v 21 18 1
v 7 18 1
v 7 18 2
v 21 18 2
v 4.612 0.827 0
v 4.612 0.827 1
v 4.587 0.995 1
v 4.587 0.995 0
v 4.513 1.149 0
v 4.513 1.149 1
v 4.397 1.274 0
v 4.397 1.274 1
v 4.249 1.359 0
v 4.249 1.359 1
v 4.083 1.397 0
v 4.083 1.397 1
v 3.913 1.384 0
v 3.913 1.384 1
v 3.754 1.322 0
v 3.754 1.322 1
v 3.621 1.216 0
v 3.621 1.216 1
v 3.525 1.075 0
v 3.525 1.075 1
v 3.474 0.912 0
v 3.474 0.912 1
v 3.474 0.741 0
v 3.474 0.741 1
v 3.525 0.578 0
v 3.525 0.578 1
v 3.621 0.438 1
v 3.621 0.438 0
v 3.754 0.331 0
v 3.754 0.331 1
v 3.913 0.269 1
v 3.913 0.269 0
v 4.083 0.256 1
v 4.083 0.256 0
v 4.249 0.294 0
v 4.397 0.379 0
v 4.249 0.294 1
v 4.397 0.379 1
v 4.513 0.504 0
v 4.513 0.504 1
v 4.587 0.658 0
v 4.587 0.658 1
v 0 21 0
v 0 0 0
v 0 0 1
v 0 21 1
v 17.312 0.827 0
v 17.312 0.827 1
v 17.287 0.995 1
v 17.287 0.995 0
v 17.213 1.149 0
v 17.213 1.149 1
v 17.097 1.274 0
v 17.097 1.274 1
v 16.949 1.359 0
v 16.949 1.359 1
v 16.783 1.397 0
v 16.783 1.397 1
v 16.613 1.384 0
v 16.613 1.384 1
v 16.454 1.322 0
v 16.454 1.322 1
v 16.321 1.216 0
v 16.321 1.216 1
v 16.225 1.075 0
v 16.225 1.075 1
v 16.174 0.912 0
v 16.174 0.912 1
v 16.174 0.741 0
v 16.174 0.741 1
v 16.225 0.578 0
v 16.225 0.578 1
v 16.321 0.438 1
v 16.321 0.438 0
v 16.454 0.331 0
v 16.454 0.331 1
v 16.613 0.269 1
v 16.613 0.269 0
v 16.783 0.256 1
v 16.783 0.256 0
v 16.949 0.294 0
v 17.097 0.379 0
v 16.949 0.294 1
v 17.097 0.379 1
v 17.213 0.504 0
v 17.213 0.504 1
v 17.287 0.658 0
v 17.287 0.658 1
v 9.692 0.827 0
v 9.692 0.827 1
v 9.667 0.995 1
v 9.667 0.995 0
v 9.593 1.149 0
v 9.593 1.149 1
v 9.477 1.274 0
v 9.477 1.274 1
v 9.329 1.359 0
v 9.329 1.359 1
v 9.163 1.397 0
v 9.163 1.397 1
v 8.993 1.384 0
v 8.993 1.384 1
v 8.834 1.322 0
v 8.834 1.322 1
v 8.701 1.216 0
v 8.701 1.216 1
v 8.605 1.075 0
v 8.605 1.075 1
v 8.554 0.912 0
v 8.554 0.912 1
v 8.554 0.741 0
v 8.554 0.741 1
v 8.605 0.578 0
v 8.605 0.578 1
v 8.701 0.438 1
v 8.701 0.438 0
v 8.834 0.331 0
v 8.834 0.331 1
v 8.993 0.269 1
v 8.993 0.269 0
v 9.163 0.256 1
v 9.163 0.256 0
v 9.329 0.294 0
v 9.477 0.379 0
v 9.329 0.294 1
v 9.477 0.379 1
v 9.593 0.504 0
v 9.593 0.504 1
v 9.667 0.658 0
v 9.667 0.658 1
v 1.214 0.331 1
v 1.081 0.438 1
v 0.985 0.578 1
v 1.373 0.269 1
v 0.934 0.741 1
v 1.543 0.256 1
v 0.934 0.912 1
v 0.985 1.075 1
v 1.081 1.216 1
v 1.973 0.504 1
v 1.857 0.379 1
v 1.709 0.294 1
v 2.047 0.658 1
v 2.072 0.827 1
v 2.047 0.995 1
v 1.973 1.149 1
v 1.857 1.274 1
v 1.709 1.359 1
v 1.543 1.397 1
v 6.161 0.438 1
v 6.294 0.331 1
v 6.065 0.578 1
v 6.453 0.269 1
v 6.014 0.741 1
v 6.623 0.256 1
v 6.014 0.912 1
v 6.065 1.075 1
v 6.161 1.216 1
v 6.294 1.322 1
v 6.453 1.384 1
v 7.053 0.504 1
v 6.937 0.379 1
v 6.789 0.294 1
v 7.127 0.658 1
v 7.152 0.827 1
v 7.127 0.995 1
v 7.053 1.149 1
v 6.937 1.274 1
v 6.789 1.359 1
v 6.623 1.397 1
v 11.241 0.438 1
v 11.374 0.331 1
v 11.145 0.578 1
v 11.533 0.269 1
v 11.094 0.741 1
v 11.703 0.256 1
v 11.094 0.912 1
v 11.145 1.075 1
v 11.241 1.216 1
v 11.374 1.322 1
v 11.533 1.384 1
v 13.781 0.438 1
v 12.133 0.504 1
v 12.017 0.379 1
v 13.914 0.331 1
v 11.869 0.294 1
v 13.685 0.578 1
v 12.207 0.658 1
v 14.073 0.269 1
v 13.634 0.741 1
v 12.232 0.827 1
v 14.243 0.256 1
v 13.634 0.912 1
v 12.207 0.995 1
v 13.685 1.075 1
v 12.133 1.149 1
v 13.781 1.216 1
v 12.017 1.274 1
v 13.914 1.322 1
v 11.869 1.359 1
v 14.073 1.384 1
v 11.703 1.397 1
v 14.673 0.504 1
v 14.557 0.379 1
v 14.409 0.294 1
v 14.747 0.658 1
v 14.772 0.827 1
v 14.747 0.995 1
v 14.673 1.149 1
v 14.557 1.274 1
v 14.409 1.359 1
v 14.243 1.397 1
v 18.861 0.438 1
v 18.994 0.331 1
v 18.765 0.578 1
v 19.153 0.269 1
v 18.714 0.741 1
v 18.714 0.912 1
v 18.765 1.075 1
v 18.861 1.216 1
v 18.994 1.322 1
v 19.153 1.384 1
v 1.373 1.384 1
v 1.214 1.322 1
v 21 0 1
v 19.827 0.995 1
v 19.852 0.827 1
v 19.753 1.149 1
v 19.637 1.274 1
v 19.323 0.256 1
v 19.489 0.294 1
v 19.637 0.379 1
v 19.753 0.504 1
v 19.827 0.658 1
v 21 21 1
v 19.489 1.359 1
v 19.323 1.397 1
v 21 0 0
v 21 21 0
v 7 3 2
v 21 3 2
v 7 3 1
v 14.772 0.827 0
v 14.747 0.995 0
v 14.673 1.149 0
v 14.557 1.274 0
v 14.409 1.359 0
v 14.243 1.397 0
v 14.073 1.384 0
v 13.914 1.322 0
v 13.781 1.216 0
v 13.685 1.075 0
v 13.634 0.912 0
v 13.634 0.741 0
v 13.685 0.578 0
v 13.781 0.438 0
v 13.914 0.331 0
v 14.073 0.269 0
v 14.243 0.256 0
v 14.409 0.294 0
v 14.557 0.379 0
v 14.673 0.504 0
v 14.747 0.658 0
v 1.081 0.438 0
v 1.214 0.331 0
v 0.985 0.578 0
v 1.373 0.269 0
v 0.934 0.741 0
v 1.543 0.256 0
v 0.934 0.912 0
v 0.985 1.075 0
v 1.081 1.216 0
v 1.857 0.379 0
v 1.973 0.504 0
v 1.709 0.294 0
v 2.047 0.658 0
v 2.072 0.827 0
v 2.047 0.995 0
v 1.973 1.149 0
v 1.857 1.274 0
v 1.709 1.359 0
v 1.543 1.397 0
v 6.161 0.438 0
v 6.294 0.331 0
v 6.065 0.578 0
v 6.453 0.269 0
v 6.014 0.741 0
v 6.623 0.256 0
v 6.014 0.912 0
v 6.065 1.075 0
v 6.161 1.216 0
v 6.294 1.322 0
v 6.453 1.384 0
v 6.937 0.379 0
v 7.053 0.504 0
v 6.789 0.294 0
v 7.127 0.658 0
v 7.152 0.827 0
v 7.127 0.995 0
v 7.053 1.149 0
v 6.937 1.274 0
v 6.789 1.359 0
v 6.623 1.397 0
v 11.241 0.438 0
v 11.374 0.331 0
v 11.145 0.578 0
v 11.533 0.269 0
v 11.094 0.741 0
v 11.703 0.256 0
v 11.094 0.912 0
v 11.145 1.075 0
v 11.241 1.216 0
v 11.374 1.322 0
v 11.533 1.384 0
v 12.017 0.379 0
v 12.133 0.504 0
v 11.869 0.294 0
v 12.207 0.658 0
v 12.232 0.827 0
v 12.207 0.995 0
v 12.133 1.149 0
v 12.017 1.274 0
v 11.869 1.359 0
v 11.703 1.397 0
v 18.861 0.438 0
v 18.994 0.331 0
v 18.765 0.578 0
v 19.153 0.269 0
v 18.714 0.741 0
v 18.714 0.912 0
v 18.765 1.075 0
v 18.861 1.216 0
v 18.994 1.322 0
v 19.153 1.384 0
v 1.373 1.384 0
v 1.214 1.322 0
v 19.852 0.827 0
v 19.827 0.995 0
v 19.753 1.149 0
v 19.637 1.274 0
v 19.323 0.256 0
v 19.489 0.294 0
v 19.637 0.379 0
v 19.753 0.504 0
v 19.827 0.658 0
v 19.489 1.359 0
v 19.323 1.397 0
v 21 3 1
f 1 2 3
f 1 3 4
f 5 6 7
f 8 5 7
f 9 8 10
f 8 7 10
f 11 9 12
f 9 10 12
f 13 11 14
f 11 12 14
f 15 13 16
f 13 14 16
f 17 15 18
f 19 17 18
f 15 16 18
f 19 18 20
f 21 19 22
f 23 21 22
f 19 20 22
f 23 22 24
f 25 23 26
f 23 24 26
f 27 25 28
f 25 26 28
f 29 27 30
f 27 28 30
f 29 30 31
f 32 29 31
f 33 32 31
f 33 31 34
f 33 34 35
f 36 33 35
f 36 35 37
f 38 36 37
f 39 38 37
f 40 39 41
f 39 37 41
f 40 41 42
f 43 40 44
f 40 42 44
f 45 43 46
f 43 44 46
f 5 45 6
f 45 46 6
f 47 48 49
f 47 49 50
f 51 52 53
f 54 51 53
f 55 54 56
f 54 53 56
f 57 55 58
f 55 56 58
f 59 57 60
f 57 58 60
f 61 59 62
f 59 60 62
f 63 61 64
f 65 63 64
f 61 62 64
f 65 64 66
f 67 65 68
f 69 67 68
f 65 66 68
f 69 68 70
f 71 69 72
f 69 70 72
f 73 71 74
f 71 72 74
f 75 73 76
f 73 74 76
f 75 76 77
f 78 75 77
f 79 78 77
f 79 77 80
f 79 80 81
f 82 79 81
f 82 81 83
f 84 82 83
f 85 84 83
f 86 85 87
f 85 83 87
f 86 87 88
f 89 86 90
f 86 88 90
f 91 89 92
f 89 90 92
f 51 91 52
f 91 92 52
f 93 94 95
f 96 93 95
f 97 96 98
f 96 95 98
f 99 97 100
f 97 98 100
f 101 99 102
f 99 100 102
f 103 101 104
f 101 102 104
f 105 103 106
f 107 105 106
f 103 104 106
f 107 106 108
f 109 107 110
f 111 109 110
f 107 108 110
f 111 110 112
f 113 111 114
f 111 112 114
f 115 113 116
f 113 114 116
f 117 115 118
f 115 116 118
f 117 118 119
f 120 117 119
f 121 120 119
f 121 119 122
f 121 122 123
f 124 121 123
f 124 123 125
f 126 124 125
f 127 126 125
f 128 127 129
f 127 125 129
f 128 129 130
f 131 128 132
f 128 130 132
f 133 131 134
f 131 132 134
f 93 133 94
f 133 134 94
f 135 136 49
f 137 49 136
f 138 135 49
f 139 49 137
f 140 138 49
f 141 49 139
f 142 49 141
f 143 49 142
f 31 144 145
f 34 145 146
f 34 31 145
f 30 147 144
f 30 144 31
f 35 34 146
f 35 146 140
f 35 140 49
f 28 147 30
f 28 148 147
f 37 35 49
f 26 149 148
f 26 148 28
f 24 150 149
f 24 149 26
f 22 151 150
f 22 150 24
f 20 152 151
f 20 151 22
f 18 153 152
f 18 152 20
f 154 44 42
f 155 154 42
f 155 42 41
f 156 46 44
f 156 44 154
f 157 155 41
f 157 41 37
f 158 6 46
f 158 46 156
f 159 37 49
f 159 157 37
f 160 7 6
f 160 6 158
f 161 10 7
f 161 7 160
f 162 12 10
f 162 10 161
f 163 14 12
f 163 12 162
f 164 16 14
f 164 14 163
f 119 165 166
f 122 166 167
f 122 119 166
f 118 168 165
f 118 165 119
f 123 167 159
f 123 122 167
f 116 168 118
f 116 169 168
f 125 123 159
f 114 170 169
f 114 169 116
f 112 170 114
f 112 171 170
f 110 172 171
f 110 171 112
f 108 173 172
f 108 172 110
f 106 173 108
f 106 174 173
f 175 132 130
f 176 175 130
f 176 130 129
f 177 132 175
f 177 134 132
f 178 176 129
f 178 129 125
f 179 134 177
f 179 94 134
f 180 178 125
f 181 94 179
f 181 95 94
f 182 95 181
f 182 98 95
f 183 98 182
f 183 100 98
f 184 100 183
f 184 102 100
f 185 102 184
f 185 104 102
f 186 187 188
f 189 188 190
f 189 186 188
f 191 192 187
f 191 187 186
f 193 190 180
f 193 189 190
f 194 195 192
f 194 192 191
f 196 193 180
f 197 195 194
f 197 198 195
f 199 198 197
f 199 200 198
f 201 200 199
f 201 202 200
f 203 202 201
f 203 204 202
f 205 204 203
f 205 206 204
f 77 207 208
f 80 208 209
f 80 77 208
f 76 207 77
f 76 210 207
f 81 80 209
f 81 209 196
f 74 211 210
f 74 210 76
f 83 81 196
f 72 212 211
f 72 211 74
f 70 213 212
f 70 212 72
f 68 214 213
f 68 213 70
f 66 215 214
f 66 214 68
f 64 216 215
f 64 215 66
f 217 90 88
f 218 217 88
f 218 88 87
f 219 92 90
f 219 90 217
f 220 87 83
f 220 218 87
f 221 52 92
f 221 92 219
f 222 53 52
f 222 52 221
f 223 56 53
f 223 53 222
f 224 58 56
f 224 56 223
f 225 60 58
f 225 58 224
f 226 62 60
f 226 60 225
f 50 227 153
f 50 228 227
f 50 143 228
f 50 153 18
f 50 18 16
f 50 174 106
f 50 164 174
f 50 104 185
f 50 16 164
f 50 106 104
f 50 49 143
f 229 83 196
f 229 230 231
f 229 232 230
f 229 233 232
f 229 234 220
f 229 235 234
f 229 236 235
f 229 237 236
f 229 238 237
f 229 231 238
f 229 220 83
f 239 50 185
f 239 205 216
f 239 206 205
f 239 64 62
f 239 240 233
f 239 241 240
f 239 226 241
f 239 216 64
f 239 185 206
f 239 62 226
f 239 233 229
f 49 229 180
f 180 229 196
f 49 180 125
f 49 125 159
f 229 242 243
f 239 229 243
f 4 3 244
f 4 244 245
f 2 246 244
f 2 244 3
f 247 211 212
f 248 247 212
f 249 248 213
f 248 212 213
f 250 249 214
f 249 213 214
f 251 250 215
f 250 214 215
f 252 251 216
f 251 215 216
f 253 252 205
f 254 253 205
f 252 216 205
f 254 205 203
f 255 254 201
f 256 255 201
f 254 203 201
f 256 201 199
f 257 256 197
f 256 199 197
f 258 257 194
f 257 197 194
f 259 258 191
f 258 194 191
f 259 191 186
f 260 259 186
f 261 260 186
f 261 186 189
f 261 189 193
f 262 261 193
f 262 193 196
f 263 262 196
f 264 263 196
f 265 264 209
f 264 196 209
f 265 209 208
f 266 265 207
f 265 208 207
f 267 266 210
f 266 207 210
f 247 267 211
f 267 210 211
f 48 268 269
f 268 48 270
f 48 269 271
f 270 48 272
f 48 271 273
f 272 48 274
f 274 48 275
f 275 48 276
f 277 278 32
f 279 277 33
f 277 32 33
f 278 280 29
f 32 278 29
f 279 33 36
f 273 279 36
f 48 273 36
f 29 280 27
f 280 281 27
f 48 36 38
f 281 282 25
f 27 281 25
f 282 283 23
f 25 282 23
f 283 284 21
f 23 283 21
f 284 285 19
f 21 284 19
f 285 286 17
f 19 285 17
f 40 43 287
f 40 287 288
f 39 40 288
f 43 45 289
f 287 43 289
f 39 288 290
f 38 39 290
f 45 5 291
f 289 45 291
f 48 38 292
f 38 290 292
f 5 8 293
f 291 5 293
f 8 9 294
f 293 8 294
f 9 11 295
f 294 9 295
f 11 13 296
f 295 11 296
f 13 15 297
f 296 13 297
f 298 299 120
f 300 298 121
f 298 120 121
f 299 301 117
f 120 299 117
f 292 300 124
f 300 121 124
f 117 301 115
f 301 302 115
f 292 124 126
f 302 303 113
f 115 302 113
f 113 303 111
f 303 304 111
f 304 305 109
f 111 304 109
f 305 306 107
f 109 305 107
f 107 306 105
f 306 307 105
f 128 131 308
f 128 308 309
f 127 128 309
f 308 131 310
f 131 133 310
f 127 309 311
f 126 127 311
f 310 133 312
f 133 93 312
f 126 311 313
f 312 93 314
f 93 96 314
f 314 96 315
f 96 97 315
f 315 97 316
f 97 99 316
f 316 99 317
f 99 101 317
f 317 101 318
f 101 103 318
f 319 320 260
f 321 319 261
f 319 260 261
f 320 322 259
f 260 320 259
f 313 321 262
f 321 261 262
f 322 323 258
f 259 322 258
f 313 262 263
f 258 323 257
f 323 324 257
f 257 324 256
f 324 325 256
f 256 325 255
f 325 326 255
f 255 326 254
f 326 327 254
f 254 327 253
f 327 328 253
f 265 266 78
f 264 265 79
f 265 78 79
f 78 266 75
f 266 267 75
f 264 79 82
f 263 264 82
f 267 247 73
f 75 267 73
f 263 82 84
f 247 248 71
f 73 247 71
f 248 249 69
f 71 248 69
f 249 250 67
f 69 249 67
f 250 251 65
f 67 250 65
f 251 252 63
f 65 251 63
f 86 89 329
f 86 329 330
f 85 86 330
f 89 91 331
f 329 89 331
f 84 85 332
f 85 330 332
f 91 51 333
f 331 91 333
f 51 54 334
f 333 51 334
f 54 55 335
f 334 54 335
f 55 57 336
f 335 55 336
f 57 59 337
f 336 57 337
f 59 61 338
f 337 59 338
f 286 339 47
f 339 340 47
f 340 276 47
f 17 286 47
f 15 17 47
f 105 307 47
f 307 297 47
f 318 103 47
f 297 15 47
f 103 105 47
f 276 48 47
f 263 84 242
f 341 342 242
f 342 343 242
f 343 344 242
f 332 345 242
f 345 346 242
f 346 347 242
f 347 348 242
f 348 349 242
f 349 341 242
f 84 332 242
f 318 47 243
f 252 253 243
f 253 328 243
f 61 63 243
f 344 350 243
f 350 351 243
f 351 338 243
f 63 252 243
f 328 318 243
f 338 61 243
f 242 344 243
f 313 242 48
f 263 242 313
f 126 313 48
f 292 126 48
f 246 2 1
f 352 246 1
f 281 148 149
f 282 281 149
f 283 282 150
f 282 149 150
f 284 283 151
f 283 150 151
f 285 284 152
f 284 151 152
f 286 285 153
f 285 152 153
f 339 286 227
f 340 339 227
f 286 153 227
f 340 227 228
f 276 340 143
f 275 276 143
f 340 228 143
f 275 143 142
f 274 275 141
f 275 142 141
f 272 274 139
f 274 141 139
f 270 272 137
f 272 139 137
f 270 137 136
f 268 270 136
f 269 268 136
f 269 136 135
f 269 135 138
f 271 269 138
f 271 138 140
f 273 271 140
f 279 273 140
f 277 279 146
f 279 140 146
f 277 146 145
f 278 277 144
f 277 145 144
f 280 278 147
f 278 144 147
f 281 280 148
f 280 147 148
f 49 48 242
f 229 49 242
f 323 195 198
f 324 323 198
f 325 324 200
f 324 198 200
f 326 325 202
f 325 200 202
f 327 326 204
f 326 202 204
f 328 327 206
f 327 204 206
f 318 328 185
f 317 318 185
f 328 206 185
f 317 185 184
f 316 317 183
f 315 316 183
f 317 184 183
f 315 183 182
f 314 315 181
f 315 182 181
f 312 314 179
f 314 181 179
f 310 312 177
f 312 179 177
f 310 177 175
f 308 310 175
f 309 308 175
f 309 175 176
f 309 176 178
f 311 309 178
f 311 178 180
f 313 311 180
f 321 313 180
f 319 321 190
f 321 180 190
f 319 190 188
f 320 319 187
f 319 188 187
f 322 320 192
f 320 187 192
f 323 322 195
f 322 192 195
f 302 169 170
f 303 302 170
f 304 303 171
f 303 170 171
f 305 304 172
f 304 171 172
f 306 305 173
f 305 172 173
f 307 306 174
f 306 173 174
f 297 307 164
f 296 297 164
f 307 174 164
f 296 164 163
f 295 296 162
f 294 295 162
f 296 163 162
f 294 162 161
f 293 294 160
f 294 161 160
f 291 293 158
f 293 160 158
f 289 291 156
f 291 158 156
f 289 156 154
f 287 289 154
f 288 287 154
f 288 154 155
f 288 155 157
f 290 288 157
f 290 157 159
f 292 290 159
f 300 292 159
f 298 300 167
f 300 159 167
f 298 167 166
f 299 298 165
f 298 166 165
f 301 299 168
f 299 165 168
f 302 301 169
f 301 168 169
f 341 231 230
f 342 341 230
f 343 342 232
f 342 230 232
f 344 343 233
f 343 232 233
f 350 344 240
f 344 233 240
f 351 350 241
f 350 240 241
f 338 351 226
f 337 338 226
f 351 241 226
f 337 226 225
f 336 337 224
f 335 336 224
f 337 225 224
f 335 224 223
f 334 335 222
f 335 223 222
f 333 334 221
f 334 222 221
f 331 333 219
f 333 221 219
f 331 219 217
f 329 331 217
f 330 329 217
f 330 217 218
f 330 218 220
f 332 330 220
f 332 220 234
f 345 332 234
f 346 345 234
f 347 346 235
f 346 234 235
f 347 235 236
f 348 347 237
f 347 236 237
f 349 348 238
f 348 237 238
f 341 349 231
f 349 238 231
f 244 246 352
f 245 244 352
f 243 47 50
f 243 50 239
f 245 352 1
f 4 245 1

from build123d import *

# Parameters (mm, degrees)
SKETCH1_W           = 21
SKETCH1_H           = 21
BOSS_EXTRUDE1_DEPTH = 1
SKETCH2_W           = 14
SKETCH2_H           = 15
BOSS_EXTRUDE2_DEPTH = 1
SKETCH3_R           = 0.571967696
CUT_EXTRUDE1_DEPTH  = 1
LPATTERN1_COUNT     = 8
LPATTERN1_PITCH     = 2.54


with BuildPart() as part:
    # Sketch1 → Boss-Extrude1 (new body)
    with BuildSketch(Plane.XY):
        with Locations((10.5, 10.5)):
            Rectangle(SKETCH1_W, SKETCH1_H)
    extrude(amount=BOSS_EXTRUDE1_DEPTH)

    # Sketch3 → Cut-Extrude1 (cut)
    with BuildSketch(Plane.XY.offset(1)):
        with Locations((1.5, 0.826638996)):
            Circle(SKETCH3_R)
    cut_extrude1 = extrude(amount=-CUT_EXTRUDE1_DEPTH, mode=Mode.SUBTRACT)

    # LPattern1: Cut-Extrude1 ×8
    with Locations(*[(i * LPATTERN1_PITCH, 0, 0) for i in range(1, LPATTERN1_COUNT)]):
        add(cut_extrude1, mode=Mode.SUBTRACT)


with BuildPart() as body_2:
    # Sketch2 → Boss-Extrude2 (new body)
    with BuildSketch(Plane.XY.offset(1)):
        with Locations((14, 10.5)):
            Rectangle(SKETCH2_W, SKETCH2_H)
    extrude(amount=BOSS_EXTRUDE2_DEPTH)


solid = Compound([part.part, body_2.part])
